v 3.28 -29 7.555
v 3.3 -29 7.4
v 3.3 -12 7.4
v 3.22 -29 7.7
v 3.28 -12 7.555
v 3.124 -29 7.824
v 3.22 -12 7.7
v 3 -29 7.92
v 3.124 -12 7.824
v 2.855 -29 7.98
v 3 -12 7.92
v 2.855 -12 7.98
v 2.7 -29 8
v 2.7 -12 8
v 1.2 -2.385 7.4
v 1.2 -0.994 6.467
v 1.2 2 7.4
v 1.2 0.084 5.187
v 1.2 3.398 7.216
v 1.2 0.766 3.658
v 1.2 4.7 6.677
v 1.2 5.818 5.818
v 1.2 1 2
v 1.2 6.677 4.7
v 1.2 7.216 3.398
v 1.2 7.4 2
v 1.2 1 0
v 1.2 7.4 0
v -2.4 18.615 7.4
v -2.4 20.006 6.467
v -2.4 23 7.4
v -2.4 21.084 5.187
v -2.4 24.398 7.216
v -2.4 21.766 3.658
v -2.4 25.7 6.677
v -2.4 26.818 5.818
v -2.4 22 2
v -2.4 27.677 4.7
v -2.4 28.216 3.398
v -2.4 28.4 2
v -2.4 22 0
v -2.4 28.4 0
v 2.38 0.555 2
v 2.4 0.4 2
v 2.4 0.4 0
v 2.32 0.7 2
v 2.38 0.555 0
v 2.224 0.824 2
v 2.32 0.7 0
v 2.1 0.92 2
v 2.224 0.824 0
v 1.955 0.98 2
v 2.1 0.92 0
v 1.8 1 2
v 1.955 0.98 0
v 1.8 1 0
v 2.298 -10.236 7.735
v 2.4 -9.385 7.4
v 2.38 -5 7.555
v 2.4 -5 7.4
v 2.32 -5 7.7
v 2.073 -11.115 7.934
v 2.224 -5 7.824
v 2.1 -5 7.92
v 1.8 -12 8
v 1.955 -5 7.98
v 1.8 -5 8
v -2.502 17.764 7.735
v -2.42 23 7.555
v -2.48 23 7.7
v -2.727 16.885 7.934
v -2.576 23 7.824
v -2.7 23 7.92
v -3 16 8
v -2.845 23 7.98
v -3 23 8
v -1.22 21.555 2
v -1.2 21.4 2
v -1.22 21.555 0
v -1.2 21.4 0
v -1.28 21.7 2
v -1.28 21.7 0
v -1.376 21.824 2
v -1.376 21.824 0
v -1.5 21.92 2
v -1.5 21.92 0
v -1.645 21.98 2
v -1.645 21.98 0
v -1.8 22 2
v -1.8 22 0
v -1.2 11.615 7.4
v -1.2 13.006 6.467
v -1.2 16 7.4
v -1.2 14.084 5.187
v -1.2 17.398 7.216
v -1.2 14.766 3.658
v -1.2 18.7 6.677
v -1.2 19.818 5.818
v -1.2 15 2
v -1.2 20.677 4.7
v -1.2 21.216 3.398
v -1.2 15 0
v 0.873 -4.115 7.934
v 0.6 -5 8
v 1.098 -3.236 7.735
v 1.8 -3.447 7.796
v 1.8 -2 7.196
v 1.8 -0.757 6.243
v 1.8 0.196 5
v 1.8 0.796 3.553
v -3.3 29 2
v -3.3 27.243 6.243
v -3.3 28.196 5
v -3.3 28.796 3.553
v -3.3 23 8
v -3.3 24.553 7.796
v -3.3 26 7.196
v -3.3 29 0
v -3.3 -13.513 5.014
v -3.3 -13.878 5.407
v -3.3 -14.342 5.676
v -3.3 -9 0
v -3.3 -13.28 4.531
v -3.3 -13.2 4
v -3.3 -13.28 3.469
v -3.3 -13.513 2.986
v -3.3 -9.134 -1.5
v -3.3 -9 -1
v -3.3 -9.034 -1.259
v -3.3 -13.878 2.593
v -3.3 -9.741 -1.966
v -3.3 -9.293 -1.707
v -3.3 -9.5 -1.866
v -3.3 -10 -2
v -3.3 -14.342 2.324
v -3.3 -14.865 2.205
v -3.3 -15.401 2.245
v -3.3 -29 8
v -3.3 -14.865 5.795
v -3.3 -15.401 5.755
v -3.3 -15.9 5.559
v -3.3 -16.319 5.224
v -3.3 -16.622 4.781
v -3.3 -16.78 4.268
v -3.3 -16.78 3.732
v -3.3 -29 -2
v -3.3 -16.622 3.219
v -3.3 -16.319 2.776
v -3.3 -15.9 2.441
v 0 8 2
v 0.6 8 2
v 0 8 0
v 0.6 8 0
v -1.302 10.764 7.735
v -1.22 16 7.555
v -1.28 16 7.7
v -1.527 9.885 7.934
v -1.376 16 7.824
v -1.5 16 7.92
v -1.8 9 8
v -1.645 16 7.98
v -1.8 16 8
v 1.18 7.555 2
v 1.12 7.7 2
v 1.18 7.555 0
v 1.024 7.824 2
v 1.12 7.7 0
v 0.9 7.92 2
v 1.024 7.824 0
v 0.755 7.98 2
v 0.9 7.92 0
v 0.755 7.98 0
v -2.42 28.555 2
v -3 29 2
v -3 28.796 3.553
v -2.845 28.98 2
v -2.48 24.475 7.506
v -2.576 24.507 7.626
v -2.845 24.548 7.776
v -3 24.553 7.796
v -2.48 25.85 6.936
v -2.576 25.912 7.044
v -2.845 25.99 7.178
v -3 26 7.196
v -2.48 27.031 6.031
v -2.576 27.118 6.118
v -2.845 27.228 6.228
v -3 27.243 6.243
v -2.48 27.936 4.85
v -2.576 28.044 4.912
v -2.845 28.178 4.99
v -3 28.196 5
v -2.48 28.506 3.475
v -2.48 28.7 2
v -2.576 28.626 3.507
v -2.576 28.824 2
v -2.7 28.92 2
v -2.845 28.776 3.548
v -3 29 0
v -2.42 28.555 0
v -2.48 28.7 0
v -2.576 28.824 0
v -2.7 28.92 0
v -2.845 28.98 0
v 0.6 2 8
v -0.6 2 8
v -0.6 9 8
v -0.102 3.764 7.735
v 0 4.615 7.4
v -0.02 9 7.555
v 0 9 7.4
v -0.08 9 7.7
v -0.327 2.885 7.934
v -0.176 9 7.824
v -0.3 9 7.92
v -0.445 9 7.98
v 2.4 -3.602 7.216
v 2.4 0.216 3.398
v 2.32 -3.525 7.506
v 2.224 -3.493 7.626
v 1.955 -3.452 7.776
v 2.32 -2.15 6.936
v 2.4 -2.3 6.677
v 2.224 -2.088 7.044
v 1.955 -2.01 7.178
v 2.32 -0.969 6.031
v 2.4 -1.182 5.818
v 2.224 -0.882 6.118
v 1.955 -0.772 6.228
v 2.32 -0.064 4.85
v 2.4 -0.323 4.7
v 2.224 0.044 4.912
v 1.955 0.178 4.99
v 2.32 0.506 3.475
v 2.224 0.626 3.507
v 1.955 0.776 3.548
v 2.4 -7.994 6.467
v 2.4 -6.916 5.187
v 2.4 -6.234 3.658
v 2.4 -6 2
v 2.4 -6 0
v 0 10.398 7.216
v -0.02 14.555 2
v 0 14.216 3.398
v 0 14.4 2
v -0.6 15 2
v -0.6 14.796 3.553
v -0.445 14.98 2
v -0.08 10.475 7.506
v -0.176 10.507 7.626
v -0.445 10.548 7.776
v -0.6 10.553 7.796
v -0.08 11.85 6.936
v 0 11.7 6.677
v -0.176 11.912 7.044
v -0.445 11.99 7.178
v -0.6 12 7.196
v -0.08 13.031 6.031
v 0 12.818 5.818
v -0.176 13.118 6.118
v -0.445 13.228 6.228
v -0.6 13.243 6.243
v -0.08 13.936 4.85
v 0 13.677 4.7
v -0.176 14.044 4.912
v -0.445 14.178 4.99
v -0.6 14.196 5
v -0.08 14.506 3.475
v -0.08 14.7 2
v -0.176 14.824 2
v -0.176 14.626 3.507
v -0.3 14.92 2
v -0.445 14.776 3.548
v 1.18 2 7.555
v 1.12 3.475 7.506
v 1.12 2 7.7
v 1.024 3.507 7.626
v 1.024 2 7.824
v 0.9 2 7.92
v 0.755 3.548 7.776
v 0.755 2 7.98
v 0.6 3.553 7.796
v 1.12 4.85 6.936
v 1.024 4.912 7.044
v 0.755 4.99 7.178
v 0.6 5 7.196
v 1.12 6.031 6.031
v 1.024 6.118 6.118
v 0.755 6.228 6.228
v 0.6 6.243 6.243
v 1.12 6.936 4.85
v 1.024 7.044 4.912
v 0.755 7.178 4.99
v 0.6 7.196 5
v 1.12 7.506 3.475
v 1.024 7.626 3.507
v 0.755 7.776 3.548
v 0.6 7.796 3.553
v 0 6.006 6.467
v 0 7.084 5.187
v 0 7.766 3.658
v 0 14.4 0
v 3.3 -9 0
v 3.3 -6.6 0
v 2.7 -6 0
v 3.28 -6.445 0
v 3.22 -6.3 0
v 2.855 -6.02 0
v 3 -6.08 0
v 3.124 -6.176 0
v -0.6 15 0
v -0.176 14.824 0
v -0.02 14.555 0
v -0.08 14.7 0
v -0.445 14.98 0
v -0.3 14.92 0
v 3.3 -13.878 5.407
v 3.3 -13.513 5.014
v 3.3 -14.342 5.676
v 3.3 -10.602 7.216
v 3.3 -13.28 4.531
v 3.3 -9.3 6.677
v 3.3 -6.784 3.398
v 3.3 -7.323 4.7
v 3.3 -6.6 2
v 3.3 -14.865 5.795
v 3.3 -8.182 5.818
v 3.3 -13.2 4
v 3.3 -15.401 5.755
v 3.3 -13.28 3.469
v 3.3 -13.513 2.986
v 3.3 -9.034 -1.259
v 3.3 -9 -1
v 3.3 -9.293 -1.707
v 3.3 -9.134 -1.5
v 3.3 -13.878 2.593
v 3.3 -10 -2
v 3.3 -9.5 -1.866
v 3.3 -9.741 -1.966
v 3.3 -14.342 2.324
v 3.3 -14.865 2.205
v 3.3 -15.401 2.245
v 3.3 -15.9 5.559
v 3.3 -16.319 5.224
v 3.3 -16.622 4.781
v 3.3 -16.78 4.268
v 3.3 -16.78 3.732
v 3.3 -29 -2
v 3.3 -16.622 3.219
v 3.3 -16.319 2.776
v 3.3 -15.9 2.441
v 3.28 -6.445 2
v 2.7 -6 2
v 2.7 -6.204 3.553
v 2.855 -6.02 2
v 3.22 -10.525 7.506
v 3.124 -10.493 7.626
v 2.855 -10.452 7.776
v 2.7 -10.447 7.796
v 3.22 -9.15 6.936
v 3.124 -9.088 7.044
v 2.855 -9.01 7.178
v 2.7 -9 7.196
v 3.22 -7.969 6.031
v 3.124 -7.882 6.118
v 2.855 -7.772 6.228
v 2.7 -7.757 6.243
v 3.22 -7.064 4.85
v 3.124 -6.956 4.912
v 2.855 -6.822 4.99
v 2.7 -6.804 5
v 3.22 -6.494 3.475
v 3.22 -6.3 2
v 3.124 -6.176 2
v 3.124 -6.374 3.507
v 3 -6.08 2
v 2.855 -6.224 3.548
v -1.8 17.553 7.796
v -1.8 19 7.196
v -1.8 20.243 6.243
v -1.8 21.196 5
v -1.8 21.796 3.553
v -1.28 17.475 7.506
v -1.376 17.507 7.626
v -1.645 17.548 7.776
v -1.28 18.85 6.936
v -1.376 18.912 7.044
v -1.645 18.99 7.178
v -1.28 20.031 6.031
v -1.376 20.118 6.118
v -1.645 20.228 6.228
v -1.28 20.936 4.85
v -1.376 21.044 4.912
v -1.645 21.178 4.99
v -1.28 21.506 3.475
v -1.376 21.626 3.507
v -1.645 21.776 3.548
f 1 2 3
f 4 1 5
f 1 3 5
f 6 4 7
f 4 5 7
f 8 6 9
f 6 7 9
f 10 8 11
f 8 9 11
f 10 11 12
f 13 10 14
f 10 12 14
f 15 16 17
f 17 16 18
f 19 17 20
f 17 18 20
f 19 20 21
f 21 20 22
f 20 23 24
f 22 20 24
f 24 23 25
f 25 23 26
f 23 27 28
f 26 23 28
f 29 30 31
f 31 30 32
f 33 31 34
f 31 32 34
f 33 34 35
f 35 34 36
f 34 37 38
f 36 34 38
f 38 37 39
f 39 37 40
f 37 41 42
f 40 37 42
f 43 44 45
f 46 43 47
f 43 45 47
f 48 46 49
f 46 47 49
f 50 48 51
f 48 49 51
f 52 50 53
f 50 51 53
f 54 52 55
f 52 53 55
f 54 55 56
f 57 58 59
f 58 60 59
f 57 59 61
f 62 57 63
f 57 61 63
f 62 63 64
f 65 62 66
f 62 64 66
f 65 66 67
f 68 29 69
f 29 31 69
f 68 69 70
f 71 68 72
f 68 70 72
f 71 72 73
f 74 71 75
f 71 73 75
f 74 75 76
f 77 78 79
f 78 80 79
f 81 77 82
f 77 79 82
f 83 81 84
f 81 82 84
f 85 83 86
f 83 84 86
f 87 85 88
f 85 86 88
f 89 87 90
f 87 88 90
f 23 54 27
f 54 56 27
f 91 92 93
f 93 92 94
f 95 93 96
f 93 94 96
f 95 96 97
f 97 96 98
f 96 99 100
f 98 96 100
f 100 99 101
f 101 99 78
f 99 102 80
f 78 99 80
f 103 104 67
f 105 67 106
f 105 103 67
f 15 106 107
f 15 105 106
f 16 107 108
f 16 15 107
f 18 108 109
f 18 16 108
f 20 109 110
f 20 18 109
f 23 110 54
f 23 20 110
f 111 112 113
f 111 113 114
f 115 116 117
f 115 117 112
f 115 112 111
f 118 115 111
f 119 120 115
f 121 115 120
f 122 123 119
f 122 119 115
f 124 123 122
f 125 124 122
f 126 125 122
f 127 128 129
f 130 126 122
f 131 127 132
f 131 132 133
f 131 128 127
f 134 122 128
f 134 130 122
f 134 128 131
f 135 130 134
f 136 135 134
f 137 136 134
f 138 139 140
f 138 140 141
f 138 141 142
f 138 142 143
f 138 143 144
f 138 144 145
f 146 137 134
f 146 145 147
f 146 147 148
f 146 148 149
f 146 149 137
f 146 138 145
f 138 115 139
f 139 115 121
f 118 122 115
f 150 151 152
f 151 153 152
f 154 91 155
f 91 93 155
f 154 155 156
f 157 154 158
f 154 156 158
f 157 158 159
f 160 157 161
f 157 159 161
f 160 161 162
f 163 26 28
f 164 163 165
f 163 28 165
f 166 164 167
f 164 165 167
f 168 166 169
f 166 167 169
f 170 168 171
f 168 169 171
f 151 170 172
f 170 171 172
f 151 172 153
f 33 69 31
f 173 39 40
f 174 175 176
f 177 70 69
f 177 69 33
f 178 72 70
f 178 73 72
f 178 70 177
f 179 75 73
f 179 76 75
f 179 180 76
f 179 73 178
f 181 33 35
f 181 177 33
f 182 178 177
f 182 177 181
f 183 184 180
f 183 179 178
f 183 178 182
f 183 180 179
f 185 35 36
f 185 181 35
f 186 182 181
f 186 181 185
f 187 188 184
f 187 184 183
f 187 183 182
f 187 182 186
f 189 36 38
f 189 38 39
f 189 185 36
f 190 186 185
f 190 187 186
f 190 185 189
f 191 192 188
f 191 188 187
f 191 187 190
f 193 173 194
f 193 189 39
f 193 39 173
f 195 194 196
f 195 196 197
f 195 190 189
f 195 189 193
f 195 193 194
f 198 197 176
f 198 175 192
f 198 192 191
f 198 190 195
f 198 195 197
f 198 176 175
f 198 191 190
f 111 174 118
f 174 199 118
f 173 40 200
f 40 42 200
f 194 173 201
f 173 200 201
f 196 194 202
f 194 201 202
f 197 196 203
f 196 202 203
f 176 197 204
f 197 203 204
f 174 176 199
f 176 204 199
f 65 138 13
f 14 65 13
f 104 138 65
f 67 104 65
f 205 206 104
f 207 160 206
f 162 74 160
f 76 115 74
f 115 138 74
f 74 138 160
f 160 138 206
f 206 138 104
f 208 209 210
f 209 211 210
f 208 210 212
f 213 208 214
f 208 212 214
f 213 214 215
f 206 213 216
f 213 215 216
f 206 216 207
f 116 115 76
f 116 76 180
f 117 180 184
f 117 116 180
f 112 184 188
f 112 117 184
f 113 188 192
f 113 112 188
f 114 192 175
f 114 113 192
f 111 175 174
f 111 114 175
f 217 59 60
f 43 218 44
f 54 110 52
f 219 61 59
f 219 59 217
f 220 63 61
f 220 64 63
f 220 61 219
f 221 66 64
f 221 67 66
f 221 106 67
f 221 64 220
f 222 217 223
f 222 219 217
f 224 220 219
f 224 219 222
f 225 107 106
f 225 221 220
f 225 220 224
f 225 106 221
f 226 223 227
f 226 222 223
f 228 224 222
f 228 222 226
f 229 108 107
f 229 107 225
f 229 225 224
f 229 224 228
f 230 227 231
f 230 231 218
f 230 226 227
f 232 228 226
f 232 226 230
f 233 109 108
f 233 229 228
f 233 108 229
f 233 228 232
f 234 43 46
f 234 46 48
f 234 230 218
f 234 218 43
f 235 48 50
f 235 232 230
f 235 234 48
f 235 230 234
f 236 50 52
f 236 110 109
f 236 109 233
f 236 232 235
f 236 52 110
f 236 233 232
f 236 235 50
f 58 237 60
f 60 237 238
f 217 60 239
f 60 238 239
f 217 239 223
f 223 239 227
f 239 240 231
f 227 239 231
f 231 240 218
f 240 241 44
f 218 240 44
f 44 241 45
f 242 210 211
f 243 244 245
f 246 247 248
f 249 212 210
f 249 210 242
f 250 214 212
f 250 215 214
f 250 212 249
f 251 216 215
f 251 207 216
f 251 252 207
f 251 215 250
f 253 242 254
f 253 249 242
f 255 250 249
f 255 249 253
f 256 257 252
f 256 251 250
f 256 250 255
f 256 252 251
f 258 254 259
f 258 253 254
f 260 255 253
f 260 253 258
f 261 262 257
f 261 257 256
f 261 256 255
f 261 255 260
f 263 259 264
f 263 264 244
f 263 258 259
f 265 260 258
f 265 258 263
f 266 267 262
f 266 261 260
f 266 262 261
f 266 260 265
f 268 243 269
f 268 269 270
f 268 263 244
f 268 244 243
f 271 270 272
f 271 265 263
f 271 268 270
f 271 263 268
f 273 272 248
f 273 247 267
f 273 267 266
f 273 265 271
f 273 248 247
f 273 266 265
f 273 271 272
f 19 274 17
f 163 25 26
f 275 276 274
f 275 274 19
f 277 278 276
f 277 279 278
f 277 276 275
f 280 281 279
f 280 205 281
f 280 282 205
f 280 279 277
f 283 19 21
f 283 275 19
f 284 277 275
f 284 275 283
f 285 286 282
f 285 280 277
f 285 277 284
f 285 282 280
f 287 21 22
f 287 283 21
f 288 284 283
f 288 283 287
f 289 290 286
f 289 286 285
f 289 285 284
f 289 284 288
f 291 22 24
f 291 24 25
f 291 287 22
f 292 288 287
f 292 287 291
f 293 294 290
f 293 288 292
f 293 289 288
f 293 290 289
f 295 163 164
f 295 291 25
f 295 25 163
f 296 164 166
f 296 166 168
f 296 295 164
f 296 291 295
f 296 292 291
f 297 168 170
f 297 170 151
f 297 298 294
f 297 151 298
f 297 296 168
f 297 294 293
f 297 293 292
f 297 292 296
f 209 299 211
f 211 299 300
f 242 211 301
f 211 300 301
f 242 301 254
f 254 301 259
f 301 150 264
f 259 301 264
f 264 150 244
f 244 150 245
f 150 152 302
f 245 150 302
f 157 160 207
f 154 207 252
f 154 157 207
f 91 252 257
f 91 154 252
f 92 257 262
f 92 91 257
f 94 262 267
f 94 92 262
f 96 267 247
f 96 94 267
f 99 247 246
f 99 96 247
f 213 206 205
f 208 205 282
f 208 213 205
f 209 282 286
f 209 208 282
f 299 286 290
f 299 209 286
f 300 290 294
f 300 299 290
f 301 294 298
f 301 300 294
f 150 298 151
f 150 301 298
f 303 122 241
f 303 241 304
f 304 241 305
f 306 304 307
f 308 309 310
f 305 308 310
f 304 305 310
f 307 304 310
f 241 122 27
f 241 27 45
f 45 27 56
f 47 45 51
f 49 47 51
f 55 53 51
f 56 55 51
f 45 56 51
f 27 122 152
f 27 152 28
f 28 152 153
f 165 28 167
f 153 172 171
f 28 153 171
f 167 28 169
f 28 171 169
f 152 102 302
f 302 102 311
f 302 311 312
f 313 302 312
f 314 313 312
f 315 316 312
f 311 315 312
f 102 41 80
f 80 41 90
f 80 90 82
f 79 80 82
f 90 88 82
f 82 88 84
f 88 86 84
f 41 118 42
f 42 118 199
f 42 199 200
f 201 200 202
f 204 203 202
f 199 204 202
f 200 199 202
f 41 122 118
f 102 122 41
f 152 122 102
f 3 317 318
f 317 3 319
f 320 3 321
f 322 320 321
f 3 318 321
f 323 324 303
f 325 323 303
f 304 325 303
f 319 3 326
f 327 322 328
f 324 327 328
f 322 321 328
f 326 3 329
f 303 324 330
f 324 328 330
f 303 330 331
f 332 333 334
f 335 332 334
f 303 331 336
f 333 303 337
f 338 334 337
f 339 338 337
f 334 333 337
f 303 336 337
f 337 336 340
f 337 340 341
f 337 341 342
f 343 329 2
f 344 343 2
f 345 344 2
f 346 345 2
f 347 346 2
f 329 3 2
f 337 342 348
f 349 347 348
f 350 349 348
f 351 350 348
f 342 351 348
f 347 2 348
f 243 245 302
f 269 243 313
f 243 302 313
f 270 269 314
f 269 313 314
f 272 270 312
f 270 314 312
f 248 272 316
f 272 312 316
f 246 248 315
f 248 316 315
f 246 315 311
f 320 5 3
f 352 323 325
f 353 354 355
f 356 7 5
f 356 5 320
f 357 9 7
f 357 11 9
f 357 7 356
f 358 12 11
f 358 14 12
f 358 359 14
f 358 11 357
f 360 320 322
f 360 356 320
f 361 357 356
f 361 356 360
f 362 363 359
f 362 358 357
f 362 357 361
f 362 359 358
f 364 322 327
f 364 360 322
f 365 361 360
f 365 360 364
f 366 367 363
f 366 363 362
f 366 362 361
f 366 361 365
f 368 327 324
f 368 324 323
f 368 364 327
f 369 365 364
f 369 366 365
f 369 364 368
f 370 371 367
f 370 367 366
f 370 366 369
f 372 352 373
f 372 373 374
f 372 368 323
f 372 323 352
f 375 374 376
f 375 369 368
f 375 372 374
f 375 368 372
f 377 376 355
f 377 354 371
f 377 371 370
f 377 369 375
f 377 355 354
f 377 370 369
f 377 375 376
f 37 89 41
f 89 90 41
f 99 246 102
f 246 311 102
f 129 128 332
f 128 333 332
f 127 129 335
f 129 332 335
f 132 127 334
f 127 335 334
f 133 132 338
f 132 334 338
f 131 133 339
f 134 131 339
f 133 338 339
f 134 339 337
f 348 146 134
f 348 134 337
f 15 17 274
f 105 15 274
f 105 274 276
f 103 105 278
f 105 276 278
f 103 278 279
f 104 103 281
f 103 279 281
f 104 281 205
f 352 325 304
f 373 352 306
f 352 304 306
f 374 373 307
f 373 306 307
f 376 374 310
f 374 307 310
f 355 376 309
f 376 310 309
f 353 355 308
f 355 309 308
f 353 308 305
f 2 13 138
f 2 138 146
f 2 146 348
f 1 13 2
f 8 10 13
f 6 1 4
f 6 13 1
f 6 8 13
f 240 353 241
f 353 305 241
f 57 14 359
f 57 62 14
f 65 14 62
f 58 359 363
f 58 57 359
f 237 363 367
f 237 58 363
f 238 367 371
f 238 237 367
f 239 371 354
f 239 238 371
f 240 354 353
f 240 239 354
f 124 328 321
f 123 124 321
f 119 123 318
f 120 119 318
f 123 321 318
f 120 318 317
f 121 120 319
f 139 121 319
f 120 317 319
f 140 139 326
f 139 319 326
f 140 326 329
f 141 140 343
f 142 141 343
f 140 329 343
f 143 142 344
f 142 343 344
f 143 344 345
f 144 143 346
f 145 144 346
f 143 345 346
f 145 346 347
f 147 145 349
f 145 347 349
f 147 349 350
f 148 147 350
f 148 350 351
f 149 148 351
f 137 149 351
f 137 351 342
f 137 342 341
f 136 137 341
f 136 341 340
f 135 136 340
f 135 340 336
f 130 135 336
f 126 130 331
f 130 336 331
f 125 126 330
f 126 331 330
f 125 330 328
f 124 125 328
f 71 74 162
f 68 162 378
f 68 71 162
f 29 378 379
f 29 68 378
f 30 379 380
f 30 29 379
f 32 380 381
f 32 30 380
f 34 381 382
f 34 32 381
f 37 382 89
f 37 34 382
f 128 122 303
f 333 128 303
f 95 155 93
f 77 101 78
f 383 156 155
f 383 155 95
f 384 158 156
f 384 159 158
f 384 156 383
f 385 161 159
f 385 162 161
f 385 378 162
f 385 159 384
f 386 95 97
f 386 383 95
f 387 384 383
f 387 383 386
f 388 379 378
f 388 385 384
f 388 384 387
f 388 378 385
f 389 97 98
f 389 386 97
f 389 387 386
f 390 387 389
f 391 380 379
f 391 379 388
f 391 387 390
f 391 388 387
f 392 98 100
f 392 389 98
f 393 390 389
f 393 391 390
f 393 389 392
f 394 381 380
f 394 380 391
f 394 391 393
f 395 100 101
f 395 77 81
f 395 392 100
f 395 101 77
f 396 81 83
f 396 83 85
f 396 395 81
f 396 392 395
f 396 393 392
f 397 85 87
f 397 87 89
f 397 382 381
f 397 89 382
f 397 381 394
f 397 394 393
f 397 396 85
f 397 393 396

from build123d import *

# Parameters (mm, degrees)
F0_W     = 6.6
F0_H     = 14
F1_DEPTH = 8
F2_DEPTH = 2
F3_R     = 1.8
F4_DEPTH = 6.6
F5_R     = 6
F6_R     = 0.6
F7_DEPTH = 6
F8_R     = 1


with BuildPart() as f1:
    # F0 (on Top) → F1 (new body)
    with BuildSketch(Plane.XY):
        with Locations((0, -22)):
            Rectangle(F0_W, F0_H)
        Polygon((-3.3, -15), (3.3, -15), (3.3, -6), (2.4, -6), (2.4, 1), (1.2, 1), (1.2, 8), (0, 8), (0, 15), (-1.2, 15), (-1.2, 22), (-2.4, 22), (-2.4, 29), (-3.3, 29), align=None)
    extrude(amount=F1_DEPTH)

    # F0 (on Top) → F2 (join)
    with BuildSketch(Plane.XY):
        with Locations((0, -22)):
            Rectangle(F0_W, F0_H)
    extrude(amount=-F2_DEPTH)

    # F3 (on face) → F4 (cut)
    with BuildSketch(Plane.YZ.offset(3.3)):
        with Locations((-15, 4)):
            Circle(F3_R)
    extrude(amount=-F4_DEPTH, mode=Mode.SUBTRACT)

    # F5
    f5_edges = [f1.edges().sort_by_distance(p)[0] for p in [
        (2.85, -6, 8),
        (1.8, 1, 8),
        (0.6, 8, 8),
        (-0.6, 15, 8),
        (-1.8, 22, 8),
        (-2.85, 29, 8),
    ]]
    fillet(f5_edges, radius=F5_R)

    # F6
    f6_edges = [f1.edges().sort_by_distance(p)[0] for p in [
        (-2.4, 27.242641, 6.242641),
        (-2.4, 29, 1),
        (3.3, -20.5, 8),
        (2.4, -9, 8),
        (2.4, -5.5, 8),
        (-2.4, 22.5, 8),
        (1.2, -2, 8),
        (-2.4, 19, 8),
        (1.2, 1.5, 8),
        (-1.2, 15.5, 8),
        (0, 5, 8),
        (-1.2, 12, 8),
        (0, 8.5, 8),
        (-1.2, 22, 1),
        (-1.2, 20.242641, 6.242641),
        (0, 15, 1),
        (0, 13.242641, 6.242641),
        (1.2, 8, 1),
        (1.2, 6.242641, 6.242641),
        (2.4, 1, 1),
        (2.4, -0.757359, 6.242641),
        (3.3, -6, 1),
        (3.3, -7.757359, 6.242641),
    ]]
    fillet(f6_edges, radius=F6_R)

    # F7 (add): a face of the model
    f7_faces = [f1.faces().sort_by_distance(p)[0] for p in [
        (0, -15, -1),
    ]]
    extrude(f7_faces, amount=F7_DEPTH)

    # F8
    f8_edges = [f1.edges().sort_by_distance(p)[0] for p in [
        (0, -9, -2),
    ]]
    fillet(f8_edges, radius=F8_R)


solid = f1.part
